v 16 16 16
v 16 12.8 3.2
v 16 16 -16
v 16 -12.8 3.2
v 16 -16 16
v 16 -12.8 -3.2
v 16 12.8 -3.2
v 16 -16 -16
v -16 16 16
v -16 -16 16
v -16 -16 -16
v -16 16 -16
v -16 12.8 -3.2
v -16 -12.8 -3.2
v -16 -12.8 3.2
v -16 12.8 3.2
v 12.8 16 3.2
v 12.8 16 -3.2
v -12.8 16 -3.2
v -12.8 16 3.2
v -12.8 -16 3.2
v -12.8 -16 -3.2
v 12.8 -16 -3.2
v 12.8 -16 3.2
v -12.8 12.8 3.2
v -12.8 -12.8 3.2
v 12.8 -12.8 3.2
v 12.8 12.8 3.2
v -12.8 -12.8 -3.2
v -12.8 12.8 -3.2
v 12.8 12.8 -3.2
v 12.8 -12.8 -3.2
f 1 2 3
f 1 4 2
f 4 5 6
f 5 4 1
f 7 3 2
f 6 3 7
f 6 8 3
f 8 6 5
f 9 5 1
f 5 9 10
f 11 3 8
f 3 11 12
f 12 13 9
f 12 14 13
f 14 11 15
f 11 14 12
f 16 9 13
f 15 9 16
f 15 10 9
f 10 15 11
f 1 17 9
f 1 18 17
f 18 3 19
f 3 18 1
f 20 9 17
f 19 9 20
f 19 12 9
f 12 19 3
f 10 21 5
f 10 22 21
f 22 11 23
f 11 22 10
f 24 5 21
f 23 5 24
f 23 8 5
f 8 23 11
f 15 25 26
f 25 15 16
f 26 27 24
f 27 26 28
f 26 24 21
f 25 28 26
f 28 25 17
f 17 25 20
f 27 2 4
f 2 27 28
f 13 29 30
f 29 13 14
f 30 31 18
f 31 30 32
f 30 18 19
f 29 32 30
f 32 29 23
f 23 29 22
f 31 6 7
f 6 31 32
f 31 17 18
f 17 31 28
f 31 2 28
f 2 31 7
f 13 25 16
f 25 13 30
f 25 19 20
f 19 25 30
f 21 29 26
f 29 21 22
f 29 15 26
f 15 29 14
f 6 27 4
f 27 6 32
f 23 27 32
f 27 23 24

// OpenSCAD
size=32; //block=32 //item=8

difference(){
cube([size*1,size*1,size*1],center=true);
cube([size*1.1,size*1.1,size*0.2],center=true);
};

for(i=[0:1:4]){
rotate([0,0,90*i]){
translate([size*0.45,size*0.45,0]){
cube([size*0.1,size*0.1,size*1],center=true);

};	//translate
};	//rotate
};	//for
